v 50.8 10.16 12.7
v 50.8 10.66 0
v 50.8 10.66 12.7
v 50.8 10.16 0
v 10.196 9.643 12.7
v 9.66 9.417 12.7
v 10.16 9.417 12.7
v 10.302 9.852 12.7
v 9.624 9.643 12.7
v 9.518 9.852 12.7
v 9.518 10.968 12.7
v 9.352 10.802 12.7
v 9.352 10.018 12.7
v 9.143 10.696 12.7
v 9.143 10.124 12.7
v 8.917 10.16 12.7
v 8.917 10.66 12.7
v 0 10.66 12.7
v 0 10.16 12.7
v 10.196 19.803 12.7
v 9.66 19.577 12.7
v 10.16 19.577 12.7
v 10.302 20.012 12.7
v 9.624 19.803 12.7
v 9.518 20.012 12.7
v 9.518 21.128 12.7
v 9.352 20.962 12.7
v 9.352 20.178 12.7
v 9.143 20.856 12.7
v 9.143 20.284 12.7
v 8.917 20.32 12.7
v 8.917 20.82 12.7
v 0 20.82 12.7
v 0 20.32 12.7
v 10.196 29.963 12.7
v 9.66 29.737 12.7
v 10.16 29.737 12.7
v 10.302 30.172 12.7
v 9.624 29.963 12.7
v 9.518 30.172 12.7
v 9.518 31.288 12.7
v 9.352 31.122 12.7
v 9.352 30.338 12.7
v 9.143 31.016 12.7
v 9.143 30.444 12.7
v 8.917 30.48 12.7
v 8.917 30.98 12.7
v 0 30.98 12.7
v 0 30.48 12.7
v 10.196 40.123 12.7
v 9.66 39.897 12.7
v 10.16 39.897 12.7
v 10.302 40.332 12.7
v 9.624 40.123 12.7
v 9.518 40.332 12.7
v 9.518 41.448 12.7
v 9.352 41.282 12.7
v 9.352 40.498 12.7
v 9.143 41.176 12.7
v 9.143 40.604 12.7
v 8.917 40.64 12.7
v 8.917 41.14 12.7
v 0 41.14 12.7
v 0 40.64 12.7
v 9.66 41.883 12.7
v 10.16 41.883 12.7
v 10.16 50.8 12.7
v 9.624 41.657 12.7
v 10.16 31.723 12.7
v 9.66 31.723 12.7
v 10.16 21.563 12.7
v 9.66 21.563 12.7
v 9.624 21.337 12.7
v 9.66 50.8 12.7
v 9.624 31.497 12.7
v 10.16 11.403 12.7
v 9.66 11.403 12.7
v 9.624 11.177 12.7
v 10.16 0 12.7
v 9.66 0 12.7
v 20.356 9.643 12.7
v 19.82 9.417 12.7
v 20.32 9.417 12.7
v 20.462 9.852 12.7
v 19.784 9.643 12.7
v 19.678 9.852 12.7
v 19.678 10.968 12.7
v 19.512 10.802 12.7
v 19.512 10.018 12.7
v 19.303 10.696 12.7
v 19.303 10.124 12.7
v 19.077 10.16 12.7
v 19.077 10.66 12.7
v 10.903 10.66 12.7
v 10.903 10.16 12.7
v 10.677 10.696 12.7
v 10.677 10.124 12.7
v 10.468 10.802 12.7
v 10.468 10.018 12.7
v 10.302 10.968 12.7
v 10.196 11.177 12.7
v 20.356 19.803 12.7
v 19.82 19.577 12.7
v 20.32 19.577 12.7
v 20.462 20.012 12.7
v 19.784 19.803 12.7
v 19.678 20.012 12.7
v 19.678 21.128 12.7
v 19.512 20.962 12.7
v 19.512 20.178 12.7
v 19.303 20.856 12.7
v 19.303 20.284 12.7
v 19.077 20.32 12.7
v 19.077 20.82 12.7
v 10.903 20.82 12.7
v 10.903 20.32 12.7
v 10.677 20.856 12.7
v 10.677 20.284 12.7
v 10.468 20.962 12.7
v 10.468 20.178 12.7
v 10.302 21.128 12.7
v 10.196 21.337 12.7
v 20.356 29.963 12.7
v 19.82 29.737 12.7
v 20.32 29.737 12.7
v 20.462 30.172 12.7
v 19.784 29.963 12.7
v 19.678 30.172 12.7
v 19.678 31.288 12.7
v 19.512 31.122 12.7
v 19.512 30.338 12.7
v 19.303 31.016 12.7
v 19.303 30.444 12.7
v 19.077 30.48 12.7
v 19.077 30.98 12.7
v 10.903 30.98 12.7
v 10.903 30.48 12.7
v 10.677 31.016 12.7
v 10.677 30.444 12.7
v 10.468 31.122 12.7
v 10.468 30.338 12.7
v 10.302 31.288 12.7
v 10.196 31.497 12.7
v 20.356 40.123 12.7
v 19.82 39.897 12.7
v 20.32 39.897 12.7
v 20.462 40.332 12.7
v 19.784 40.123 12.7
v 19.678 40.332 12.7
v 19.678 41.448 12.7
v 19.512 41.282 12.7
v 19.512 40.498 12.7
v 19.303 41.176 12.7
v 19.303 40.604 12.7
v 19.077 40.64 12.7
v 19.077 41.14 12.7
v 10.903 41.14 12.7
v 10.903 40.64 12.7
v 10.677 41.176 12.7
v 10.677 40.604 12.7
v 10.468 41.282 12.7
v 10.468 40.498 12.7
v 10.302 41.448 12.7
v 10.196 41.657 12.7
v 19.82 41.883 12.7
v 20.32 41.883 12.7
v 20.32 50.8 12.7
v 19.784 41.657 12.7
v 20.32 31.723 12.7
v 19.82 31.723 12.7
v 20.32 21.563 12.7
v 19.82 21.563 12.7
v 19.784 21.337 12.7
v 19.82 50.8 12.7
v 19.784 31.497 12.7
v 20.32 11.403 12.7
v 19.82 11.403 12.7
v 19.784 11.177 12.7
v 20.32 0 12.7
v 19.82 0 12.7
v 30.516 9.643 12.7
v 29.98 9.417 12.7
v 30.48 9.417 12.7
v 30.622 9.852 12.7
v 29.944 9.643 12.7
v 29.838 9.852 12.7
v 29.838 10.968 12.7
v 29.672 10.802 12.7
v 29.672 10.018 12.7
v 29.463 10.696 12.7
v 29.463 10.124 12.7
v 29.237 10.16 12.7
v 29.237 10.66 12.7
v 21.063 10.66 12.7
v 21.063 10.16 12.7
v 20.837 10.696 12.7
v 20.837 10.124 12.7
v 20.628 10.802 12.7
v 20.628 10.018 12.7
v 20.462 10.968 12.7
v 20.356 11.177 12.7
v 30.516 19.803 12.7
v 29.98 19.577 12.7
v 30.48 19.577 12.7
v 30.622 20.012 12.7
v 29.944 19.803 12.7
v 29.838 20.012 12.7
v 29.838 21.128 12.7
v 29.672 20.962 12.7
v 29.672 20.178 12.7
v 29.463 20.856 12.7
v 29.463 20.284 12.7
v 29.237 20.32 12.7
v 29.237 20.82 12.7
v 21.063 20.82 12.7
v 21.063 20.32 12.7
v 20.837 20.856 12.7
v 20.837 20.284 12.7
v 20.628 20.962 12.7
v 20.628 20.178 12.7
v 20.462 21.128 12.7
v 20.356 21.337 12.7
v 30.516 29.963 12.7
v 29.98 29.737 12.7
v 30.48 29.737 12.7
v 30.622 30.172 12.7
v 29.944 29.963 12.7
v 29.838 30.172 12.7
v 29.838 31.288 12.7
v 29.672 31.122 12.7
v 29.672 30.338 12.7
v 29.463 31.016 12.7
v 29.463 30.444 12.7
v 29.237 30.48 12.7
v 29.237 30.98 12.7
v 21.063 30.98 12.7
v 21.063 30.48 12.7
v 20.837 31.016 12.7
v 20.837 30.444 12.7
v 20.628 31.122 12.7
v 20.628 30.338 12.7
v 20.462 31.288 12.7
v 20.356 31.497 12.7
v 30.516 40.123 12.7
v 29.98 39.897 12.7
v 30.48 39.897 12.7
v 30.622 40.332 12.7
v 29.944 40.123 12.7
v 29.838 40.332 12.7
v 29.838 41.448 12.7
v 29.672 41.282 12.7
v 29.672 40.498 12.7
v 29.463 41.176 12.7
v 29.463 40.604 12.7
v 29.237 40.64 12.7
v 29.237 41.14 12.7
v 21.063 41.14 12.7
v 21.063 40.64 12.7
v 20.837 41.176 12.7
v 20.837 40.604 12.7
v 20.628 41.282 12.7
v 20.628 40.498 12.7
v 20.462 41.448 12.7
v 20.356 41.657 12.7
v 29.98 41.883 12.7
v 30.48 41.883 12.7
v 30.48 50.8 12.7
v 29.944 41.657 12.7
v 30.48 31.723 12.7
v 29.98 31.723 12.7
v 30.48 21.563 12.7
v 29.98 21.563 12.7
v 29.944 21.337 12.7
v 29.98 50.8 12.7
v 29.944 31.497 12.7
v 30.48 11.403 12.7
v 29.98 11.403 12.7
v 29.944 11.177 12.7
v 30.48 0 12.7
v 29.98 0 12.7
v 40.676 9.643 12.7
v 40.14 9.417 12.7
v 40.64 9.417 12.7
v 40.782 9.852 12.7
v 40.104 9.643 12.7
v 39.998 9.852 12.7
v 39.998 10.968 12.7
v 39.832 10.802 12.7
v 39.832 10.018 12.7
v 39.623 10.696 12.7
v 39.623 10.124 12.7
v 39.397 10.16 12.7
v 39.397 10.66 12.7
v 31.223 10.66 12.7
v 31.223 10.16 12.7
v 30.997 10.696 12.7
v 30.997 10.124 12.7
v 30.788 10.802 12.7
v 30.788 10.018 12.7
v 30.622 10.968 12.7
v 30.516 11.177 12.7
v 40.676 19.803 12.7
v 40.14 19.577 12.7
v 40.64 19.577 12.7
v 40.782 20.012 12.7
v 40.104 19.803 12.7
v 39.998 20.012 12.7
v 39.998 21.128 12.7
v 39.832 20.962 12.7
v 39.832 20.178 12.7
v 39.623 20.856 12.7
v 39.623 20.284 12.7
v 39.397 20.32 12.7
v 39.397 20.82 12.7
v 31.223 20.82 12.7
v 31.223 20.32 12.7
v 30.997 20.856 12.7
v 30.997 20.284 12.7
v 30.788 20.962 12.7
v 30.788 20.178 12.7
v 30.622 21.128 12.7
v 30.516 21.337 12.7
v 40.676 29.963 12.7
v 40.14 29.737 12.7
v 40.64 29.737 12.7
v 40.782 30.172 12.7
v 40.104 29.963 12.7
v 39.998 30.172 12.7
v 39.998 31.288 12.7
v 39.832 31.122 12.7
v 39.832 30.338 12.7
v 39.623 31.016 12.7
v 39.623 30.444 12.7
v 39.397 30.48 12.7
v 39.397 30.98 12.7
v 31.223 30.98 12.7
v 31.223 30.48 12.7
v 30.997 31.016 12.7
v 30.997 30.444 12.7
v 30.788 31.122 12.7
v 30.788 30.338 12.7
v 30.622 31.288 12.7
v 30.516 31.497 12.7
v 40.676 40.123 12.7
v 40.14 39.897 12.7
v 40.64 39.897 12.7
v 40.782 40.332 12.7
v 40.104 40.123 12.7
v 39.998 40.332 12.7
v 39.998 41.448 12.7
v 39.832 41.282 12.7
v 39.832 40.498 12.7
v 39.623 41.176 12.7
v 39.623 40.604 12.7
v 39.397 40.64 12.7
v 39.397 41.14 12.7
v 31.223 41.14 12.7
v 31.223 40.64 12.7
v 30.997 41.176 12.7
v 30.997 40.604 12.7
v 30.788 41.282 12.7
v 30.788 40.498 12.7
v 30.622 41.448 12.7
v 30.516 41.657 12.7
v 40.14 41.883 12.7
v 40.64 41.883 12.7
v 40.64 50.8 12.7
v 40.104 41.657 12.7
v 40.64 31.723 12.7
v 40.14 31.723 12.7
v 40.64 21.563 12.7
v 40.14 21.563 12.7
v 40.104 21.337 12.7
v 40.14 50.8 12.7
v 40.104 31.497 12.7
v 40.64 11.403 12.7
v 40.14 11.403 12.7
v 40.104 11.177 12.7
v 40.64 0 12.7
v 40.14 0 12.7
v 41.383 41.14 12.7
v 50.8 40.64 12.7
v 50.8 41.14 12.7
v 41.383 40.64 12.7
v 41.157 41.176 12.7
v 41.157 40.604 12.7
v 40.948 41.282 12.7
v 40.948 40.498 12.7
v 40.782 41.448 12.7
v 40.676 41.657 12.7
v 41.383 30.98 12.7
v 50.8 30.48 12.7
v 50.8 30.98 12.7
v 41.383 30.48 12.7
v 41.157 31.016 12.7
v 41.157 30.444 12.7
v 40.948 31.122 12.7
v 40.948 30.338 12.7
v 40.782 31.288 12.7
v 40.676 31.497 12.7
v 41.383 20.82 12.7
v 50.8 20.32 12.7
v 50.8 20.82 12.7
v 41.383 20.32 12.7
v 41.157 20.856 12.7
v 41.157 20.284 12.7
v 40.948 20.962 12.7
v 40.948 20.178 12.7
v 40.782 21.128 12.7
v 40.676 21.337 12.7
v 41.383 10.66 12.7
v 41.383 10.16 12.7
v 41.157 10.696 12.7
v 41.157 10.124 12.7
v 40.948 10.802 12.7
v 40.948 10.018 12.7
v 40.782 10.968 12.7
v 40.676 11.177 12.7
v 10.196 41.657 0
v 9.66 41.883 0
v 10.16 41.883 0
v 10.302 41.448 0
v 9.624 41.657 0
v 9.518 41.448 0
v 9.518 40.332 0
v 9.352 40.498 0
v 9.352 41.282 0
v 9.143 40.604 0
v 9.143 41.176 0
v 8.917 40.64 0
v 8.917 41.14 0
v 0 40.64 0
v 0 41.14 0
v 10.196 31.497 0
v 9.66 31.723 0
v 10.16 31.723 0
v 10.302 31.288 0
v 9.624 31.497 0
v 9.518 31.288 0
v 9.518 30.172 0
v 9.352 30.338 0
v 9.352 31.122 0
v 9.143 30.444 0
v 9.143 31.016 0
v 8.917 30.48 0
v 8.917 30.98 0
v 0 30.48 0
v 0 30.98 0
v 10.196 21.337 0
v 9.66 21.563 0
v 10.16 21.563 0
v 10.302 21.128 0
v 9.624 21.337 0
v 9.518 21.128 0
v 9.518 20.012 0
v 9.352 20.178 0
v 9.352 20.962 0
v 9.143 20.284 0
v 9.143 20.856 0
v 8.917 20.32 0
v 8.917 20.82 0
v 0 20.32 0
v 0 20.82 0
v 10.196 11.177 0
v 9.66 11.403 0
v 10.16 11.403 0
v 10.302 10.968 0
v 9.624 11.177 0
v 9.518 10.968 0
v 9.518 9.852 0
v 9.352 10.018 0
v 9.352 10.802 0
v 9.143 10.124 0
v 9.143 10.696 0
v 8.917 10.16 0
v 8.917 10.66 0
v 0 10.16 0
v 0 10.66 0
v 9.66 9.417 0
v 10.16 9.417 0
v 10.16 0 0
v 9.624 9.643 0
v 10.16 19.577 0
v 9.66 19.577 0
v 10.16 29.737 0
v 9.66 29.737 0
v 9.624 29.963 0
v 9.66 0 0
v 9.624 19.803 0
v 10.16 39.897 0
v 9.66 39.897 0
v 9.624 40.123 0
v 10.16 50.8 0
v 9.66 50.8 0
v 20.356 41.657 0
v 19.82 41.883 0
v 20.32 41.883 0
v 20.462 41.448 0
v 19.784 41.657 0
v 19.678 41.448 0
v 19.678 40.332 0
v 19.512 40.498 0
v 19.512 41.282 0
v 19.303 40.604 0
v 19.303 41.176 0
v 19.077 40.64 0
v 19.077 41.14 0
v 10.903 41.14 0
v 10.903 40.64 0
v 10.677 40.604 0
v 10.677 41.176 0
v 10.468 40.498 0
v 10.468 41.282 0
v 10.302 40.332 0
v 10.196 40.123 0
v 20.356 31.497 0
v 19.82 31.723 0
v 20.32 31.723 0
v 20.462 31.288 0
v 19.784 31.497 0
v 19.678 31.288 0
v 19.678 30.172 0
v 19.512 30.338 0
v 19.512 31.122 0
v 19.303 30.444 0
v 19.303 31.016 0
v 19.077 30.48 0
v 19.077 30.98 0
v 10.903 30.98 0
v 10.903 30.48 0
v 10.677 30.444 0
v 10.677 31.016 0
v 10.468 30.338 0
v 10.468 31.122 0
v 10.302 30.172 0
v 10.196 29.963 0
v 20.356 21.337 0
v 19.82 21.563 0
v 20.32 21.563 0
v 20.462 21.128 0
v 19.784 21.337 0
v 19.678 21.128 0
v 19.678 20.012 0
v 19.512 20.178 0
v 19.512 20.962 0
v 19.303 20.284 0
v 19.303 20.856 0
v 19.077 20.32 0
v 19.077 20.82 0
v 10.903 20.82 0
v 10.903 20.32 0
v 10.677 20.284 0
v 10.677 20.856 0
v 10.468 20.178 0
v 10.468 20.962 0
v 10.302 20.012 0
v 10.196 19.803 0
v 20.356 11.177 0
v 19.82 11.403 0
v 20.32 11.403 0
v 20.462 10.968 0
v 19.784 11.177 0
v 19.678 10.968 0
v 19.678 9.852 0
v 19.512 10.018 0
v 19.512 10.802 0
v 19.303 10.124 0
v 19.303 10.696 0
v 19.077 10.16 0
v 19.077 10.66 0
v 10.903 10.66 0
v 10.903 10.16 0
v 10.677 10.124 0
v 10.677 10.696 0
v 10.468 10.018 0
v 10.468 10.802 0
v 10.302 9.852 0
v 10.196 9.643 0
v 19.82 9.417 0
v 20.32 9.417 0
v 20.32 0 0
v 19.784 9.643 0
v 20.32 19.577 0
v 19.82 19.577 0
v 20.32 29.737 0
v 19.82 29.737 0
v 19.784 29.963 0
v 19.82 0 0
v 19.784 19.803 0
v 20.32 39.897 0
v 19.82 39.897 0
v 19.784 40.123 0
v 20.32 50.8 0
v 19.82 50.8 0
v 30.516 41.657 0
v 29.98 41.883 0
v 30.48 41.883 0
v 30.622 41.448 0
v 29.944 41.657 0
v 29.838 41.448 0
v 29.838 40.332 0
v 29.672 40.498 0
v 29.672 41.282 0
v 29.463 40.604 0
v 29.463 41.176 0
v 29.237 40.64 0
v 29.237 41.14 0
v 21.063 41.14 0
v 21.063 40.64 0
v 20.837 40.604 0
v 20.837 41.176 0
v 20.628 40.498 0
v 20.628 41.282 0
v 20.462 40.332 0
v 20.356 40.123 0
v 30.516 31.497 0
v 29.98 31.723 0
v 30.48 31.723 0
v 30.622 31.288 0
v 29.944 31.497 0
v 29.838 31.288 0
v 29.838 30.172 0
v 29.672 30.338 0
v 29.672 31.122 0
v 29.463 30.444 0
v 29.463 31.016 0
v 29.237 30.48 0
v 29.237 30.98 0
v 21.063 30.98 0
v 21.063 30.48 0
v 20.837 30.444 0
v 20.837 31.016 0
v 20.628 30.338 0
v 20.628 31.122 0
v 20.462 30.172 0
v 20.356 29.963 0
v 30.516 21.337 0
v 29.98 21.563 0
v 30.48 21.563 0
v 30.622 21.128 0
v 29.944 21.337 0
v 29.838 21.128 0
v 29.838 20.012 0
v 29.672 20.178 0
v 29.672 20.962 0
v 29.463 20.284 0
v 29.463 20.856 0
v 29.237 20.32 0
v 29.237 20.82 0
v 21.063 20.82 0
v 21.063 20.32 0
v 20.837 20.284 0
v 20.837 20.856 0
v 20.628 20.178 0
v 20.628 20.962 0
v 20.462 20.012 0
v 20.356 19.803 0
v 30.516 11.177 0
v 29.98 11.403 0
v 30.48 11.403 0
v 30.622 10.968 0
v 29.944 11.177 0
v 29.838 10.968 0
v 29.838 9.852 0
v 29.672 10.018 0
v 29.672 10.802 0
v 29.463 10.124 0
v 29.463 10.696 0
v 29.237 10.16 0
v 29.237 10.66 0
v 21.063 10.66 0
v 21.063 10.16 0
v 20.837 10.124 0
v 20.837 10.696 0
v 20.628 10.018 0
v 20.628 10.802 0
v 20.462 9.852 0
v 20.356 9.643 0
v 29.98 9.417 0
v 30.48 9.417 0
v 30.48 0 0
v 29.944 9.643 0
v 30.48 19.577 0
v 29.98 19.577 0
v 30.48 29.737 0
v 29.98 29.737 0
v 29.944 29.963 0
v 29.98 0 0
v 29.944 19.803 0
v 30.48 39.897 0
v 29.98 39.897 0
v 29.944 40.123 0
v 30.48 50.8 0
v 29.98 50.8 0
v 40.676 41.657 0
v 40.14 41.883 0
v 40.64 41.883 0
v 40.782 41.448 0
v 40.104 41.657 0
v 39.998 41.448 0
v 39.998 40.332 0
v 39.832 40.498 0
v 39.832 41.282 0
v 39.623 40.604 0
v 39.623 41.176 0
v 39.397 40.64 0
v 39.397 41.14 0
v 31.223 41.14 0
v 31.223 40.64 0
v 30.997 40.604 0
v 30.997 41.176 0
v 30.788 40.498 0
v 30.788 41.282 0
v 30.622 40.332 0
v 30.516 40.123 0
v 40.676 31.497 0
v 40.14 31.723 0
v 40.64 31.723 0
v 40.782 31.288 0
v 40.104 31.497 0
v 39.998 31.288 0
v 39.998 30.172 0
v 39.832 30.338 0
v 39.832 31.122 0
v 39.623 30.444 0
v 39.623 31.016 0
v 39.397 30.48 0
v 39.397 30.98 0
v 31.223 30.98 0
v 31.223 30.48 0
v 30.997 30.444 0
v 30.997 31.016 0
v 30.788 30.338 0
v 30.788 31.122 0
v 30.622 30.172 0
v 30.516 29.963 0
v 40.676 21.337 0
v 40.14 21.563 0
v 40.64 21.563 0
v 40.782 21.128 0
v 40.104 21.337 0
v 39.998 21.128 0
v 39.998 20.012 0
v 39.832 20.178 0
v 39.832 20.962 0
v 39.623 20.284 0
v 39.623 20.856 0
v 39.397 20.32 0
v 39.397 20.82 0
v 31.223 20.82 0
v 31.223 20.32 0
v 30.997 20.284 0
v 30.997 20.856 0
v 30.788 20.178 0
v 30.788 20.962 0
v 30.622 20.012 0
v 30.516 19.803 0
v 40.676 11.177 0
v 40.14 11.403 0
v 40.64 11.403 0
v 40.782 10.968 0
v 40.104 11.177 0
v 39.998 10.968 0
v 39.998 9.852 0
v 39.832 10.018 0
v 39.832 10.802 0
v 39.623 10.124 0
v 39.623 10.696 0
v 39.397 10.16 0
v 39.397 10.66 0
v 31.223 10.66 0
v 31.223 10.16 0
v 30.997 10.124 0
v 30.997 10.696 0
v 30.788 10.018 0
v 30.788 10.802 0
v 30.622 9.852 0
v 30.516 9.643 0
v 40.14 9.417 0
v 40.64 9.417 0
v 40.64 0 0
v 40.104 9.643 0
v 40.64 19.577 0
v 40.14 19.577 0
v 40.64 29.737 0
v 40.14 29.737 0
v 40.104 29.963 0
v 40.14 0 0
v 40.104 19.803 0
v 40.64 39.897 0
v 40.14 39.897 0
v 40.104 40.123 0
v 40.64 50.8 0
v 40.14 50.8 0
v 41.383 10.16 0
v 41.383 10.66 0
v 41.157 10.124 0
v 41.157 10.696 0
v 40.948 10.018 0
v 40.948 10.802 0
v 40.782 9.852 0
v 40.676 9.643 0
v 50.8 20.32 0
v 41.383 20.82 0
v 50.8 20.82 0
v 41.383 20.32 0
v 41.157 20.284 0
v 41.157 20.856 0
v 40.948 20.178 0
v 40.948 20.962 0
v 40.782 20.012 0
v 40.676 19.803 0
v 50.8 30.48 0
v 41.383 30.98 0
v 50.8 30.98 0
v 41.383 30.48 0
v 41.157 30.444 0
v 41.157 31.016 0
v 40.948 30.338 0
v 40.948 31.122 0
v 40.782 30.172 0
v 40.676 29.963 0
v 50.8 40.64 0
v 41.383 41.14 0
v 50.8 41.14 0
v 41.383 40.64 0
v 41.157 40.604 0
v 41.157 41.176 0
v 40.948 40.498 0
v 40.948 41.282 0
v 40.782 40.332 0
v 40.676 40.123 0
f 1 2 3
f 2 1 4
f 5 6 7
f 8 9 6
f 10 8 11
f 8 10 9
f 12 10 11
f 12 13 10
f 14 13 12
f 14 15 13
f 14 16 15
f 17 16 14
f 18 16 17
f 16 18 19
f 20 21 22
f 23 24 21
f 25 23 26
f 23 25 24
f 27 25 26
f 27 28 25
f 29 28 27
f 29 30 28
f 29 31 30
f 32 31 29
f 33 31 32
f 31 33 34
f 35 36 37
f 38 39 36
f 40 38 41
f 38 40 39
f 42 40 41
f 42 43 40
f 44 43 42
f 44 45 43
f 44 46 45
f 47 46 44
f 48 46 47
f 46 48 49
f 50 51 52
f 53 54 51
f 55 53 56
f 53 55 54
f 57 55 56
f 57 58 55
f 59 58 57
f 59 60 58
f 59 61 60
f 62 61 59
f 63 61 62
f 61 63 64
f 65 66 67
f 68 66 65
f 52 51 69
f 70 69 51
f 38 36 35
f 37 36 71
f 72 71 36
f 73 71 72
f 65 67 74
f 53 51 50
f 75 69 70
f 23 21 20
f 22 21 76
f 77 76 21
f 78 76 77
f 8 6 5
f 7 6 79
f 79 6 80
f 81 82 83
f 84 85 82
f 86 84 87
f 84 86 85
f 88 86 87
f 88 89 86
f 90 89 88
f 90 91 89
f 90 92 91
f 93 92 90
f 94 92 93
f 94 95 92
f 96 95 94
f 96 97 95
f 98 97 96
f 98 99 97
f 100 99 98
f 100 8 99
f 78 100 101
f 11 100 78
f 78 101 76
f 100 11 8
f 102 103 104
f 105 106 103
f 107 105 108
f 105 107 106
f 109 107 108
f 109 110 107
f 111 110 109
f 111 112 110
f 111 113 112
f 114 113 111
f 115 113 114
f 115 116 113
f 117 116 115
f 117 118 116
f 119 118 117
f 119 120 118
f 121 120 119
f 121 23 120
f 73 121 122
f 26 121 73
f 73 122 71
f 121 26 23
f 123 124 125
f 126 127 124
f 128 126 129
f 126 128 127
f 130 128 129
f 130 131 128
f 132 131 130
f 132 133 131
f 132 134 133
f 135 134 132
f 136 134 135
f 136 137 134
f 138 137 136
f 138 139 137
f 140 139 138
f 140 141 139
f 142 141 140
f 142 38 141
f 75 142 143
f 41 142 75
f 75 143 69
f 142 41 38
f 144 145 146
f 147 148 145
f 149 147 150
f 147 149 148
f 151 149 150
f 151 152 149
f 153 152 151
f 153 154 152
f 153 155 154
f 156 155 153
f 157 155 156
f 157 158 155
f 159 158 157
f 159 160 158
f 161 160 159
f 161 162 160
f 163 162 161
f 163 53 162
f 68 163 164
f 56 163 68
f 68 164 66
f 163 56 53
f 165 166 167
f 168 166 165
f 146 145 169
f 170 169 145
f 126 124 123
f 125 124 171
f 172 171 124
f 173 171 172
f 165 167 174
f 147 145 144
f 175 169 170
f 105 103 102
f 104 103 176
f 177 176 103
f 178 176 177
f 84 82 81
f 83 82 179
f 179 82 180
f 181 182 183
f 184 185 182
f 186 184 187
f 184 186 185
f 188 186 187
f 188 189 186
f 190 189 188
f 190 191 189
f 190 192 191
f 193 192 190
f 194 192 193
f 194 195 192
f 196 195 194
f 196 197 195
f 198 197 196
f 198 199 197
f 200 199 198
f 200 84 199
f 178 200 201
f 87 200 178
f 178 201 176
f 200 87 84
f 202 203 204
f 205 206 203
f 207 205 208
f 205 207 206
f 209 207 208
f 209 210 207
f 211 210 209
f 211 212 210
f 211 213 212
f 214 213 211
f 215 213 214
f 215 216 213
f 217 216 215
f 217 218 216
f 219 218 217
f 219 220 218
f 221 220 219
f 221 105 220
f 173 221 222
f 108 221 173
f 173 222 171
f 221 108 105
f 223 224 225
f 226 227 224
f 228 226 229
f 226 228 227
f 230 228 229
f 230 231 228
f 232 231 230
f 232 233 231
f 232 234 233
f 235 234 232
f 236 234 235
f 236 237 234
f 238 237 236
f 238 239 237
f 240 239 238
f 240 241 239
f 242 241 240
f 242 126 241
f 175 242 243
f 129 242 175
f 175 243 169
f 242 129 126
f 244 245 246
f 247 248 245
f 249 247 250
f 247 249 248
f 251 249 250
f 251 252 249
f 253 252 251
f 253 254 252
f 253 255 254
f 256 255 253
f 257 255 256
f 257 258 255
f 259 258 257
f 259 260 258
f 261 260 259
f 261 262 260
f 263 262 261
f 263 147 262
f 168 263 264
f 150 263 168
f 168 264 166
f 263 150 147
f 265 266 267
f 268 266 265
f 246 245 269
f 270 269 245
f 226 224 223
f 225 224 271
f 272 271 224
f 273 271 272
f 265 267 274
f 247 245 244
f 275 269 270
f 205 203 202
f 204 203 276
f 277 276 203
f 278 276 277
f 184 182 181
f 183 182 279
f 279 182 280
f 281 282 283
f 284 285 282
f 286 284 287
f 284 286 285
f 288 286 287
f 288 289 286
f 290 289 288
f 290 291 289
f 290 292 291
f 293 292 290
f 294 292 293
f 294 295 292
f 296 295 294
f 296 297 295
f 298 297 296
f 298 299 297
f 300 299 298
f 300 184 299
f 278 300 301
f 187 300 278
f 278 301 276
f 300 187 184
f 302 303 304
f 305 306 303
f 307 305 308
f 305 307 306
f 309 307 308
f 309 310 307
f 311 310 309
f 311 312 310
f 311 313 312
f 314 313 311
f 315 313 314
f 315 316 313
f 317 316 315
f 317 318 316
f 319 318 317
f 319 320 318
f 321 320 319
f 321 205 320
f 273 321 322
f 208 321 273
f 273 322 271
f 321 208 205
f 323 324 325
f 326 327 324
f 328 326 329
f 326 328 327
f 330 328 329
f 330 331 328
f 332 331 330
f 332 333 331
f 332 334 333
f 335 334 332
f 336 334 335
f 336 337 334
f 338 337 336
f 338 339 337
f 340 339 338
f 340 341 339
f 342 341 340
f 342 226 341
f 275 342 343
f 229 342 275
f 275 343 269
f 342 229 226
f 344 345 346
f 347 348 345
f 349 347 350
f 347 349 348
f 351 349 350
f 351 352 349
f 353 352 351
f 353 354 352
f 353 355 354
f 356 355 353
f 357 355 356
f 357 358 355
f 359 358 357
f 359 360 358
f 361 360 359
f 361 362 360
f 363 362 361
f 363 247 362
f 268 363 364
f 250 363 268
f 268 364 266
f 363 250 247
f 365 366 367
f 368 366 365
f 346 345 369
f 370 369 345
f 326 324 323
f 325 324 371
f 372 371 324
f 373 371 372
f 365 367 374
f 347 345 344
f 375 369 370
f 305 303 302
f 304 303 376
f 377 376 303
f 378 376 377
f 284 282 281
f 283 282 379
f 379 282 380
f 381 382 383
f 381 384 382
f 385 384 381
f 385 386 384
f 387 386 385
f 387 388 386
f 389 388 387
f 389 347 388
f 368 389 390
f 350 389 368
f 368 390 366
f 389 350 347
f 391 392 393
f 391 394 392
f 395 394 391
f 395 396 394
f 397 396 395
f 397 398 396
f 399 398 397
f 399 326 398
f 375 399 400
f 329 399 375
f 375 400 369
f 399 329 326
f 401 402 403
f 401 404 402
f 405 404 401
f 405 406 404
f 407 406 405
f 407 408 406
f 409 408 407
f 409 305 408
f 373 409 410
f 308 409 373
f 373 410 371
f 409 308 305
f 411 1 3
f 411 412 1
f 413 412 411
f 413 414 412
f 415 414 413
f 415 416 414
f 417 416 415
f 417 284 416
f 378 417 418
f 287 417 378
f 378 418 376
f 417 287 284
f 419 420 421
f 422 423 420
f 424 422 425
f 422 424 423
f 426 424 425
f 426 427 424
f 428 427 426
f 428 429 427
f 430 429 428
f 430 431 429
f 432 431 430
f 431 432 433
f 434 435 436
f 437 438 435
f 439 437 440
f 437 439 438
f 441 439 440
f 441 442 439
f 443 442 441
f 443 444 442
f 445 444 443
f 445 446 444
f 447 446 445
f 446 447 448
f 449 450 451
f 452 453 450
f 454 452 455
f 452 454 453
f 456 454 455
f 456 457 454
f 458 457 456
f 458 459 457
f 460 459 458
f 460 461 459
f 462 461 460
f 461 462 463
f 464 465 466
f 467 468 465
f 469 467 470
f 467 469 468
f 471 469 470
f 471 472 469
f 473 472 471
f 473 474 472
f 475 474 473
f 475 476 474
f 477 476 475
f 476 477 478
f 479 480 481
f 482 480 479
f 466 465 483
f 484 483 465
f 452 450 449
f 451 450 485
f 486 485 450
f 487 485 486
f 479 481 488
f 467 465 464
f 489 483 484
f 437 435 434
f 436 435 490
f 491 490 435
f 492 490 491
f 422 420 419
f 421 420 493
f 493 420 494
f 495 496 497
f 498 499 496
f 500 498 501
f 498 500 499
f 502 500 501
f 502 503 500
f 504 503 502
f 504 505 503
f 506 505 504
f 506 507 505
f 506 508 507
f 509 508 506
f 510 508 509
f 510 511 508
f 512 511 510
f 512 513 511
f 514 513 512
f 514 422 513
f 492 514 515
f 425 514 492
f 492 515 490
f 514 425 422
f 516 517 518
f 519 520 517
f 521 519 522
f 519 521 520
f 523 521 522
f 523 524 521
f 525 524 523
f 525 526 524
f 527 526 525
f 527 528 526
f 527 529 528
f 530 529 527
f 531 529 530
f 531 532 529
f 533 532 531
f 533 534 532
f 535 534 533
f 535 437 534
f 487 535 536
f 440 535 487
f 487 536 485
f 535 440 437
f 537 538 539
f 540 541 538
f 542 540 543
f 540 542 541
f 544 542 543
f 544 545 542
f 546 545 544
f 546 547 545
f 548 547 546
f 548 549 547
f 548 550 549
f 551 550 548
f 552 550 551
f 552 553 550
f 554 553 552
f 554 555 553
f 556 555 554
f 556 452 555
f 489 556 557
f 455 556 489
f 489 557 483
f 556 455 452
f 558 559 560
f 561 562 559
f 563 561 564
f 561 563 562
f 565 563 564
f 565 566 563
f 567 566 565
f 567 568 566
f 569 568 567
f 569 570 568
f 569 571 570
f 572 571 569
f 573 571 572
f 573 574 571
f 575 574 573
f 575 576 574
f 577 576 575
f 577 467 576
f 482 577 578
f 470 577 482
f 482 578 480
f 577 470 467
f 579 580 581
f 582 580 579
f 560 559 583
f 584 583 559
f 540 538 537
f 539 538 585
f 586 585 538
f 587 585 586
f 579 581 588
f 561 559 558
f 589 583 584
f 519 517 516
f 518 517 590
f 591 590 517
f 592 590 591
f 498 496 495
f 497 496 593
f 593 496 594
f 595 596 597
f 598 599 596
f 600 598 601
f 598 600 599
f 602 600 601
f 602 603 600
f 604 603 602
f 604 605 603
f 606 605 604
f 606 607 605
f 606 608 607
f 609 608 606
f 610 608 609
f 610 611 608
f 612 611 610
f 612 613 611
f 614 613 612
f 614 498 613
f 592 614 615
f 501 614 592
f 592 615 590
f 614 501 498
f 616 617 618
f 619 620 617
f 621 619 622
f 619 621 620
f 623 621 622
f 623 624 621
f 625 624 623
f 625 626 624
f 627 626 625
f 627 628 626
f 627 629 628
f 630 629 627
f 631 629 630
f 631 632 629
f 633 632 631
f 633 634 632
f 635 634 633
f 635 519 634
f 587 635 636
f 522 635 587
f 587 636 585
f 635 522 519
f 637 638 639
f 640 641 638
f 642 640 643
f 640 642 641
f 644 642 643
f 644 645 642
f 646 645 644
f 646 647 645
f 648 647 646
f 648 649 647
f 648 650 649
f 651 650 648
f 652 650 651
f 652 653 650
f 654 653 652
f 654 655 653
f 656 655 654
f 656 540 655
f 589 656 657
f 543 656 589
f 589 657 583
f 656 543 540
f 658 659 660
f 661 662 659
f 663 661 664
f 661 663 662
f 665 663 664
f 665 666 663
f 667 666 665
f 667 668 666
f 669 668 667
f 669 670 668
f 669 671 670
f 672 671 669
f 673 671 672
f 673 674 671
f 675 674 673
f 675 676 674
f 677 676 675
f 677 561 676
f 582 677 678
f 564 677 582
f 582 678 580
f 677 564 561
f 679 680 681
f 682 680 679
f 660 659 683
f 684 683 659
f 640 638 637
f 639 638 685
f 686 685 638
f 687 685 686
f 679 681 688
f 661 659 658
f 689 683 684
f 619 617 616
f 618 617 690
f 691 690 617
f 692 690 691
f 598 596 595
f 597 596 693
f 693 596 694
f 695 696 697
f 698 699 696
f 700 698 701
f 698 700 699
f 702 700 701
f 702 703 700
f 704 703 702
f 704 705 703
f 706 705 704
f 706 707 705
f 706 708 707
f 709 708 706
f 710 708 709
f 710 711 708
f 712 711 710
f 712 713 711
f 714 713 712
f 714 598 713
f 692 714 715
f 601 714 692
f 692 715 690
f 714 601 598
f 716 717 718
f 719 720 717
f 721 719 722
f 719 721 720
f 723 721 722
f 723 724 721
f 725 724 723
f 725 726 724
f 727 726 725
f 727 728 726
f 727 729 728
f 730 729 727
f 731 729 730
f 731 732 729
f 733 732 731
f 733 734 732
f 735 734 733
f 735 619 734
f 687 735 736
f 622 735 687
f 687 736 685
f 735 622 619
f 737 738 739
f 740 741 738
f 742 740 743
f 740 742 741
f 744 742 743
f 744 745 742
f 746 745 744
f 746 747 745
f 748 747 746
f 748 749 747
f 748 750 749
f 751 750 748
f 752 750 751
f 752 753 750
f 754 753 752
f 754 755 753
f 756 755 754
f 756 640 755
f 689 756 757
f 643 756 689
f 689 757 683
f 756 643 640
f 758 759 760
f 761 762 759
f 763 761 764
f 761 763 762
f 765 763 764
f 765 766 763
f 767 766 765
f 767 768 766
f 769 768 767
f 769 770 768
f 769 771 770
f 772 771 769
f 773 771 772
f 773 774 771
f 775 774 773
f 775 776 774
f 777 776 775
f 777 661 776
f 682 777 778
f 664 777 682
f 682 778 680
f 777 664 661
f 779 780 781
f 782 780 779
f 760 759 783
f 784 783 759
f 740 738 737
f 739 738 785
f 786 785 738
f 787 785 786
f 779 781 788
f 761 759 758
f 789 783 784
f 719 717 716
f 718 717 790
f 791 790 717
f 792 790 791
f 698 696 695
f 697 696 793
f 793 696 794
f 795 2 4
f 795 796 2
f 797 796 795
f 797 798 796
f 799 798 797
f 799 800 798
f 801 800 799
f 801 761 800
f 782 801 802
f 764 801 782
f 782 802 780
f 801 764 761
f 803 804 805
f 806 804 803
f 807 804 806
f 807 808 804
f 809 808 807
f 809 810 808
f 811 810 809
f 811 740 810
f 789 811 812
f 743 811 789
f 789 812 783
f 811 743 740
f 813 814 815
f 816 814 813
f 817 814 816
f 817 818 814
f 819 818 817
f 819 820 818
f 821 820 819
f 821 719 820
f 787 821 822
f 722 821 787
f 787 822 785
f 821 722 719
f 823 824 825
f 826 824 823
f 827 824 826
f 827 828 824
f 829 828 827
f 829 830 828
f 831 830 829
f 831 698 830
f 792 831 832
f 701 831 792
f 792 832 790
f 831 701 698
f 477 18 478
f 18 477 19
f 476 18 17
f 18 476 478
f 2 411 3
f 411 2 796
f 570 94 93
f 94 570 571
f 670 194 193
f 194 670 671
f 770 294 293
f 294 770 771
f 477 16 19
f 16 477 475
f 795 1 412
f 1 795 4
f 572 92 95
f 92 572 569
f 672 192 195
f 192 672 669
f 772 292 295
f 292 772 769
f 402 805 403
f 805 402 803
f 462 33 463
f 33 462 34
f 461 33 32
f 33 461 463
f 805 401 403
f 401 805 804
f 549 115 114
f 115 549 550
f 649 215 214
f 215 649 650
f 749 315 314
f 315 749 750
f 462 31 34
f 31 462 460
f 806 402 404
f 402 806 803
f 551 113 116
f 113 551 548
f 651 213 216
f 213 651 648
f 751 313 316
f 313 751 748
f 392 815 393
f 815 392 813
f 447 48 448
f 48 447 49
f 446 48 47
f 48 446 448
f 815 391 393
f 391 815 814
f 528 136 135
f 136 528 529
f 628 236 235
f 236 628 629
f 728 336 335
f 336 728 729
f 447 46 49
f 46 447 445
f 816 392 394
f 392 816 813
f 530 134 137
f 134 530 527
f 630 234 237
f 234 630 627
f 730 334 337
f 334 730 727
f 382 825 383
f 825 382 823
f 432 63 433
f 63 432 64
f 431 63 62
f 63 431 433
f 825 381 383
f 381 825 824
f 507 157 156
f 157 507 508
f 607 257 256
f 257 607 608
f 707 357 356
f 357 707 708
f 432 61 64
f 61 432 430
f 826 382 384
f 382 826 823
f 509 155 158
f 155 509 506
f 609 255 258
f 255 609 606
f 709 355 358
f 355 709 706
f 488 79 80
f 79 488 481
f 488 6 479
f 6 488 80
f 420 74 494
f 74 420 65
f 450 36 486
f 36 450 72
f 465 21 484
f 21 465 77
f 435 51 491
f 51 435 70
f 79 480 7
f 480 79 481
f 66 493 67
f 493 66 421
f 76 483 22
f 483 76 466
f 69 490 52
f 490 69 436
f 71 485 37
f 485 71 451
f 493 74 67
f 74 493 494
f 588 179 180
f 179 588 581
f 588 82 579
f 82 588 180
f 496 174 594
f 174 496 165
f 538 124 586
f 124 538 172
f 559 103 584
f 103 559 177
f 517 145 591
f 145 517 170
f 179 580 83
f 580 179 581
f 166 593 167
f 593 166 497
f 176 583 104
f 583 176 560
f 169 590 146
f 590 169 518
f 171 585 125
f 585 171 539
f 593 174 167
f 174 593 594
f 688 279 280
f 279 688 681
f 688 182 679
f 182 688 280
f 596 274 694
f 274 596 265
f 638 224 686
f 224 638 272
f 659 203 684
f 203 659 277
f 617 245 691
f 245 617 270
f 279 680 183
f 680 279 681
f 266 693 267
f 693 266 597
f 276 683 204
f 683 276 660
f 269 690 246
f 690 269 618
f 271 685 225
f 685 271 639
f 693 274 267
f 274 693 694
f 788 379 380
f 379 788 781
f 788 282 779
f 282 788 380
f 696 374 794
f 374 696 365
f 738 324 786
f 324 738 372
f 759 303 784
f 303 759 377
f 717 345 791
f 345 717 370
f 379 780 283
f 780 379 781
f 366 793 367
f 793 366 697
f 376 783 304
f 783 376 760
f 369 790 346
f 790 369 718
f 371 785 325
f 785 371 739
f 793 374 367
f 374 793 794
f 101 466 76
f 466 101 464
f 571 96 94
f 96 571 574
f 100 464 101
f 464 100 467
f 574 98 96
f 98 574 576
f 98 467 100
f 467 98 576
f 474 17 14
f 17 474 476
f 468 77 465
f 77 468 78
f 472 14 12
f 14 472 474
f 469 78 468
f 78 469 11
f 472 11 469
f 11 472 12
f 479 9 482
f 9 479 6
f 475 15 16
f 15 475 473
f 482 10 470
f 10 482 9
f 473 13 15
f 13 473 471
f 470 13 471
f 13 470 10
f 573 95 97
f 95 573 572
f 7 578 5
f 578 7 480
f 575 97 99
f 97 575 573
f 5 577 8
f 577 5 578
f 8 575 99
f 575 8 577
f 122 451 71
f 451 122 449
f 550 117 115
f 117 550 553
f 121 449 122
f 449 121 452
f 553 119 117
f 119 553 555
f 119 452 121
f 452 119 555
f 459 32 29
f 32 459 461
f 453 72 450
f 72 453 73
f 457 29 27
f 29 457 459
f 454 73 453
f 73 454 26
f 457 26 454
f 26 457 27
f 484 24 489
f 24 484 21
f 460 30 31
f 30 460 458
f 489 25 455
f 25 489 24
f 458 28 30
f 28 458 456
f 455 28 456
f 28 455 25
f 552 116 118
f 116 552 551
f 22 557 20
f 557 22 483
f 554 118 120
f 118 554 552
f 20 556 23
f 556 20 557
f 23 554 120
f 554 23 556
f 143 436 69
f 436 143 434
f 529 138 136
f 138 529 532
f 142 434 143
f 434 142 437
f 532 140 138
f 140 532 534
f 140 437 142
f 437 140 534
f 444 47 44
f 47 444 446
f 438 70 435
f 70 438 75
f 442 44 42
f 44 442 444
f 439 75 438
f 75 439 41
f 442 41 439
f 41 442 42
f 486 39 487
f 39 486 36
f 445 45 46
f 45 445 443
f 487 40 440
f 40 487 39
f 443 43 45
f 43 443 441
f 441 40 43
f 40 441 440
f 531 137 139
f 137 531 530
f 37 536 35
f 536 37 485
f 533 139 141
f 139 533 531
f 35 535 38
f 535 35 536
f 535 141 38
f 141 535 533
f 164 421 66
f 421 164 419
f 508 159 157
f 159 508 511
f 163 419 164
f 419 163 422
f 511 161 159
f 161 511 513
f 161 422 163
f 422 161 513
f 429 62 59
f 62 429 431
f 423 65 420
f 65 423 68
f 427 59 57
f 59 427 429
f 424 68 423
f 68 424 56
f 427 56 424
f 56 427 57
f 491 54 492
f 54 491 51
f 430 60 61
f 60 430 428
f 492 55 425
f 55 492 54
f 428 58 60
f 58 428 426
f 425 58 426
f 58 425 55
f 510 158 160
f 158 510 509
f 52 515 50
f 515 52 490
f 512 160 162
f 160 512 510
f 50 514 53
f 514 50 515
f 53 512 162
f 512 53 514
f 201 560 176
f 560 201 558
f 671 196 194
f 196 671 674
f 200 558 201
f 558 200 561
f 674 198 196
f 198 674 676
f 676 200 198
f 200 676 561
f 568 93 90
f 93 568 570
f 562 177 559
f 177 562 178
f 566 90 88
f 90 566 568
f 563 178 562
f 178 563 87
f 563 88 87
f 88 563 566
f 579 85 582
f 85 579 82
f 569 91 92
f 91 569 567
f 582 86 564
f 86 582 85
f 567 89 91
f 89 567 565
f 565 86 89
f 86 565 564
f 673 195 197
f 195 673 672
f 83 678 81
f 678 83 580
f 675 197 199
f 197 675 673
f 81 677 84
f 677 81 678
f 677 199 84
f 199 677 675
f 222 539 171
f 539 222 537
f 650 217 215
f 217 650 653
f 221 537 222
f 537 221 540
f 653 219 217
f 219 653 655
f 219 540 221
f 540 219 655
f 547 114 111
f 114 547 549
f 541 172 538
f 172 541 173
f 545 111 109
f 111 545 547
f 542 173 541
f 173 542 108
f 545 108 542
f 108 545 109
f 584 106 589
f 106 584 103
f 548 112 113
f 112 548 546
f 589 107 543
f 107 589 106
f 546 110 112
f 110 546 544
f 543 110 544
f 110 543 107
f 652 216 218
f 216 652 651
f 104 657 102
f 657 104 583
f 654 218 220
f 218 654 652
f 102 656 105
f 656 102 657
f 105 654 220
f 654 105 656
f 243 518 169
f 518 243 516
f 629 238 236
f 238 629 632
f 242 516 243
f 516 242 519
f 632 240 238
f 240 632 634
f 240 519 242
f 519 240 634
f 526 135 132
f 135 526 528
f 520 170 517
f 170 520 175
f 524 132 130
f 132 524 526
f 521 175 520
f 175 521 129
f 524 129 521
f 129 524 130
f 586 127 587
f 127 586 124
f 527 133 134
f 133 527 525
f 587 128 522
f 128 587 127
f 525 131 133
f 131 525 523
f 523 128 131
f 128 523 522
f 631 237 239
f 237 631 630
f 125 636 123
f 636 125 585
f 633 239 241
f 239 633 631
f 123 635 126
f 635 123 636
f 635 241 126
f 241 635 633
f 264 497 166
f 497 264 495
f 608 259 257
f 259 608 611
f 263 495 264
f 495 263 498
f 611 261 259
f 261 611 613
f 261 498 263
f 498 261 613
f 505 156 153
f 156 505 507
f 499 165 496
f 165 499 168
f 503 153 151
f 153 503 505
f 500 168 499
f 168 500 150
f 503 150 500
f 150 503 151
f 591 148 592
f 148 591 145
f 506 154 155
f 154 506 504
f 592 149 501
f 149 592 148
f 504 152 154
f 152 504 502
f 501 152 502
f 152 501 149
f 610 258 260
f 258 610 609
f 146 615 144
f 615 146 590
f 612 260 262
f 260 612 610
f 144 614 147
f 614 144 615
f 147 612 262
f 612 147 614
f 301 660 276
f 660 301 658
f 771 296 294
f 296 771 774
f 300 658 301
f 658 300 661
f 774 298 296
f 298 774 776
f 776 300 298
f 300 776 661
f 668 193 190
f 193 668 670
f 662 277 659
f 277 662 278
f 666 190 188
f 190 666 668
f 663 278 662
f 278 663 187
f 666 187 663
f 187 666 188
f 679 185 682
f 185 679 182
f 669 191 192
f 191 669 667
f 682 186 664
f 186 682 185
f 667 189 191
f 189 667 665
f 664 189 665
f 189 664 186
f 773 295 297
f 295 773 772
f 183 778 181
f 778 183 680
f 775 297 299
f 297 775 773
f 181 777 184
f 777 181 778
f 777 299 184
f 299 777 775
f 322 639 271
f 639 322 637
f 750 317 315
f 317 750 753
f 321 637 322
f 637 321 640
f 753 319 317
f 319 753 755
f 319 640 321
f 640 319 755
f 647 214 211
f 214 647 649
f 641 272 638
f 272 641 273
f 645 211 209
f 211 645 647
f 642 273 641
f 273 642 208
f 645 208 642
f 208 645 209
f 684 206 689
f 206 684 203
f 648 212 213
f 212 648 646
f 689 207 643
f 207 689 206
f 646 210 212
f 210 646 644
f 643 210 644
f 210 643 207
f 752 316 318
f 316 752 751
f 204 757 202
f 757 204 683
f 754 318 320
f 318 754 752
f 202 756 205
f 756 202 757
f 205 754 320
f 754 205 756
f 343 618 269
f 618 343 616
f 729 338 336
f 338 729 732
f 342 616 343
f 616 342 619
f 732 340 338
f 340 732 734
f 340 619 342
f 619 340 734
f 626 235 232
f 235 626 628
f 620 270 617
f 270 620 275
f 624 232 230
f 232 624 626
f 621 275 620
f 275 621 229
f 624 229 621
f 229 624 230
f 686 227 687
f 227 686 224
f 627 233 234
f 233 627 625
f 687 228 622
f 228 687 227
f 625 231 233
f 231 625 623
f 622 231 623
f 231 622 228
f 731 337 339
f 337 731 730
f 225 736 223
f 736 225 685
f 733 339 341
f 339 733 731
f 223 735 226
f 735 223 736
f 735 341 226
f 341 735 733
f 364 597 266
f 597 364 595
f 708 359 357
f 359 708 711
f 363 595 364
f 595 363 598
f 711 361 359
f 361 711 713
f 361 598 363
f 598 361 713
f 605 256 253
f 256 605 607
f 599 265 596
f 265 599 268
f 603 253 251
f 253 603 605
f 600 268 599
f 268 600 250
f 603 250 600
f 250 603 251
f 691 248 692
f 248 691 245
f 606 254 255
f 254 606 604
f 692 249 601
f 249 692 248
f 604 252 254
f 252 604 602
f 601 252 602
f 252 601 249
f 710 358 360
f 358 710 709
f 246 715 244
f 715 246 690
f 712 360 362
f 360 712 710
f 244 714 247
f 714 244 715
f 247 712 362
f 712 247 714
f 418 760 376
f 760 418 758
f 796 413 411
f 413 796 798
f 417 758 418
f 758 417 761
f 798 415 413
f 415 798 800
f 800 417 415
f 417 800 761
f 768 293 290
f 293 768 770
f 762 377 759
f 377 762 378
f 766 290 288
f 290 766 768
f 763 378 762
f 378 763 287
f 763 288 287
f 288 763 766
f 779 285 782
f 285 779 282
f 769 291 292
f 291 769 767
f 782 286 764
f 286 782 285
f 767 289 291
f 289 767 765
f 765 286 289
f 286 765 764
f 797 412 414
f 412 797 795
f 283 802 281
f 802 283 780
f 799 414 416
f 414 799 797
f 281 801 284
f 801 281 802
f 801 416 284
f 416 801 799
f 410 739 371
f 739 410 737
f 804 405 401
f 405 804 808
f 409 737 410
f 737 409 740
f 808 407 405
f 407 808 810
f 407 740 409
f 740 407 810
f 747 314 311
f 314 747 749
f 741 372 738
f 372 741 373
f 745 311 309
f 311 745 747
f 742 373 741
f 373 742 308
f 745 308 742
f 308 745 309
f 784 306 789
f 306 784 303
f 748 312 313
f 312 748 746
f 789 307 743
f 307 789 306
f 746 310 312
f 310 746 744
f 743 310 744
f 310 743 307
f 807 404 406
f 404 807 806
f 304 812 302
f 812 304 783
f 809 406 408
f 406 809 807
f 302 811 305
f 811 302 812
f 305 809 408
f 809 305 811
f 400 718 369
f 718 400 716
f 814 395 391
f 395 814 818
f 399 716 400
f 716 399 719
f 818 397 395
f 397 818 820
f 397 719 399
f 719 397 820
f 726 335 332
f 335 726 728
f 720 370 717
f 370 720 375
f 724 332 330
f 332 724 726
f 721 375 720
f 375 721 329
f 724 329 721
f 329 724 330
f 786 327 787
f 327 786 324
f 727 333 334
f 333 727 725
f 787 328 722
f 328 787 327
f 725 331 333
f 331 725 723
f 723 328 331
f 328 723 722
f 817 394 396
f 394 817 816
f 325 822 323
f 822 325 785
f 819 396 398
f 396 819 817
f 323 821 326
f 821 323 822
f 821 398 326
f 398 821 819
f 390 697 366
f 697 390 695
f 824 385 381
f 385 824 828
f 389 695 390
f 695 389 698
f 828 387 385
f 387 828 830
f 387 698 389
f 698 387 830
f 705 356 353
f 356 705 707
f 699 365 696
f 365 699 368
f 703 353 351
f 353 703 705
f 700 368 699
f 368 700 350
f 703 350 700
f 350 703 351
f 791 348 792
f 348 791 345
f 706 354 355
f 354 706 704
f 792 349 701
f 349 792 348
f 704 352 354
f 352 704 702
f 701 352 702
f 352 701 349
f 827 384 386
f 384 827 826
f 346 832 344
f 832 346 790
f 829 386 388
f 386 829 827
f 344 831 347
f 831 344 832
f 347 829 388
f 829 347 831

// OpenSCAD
height=12.7;				//divider height
width=50.8;			//container width
depth=50.8;			//container depth
row_dividers=4;		//# row dividers
column_dividers=4;	//# column dividers
fillet_diam=1.5;	   //fillet diameter 
wall_thickness=0.5;		//wall thickness

ff=0.001*1;				//fudge factor to create a closed manifold



union()
{

//// Dividers

	for(j = [0:row_dividers - 1])
	{
		translate([0,(depth/(row_dividers+1))+j*(depth/(row_dividers+1)),0]) cube([width,wall_thickness,height]);
	}

	for(k = [0:column_dividers - 1])
	{
		rotate([0,0,90]) translate([0,-(width/(column_dividers+1))-k*(width/(column_dividers+1)),0]) cube([depth,wall_thickness,height]);
	}

//// Fillets

	for(m = [0:column_dividers - 1])
	{
		for(n = [0:row_dividers - 1])
		{
			//// Upper right fillet
			translate([(width/(column_dividers+1))+m*(width/(column_dividers+1))-ff,(depth/(row_dividers+1))+n*(depth/(row_dividers+1))+wall_thickness-ff,0]) fillet();

			//// Upper left fillet
			translate([(width/(column_dividers+1))+m*(width/(column_dividers+1))-wall_thickness+ff,(depth/(row_dividers+1))+n*(depth/(row_dividers+1))+wall_thickness-ff,0]) rotate([0,0,90]) fillet();

			//// Lower left fillet
			translate([(width/(column_dividers+1))+m*(width/(column_dividers+1))-wall_thickness+ff,(depth/(row_dividers+1))+n*(depth/(row_dividers+1))+ff,0]) rotate([0,0,180]) fillet();

			//// Lower right fillet
			translate([(width/(column_dividers+1))+m*(width/(column_dividers+1))-ff,(depth/(row_dividers+1))+n*(depth/(row_dividers+1))+ff,0]) rotate([0,0,270]) fillet();

		}
	}

};



//////////// module definitions ///////////////////////

module fillet() 
{
	difference()
	{
		cube([fillet_diam/2,fillet_diam/2,height]);
		translate([fillet_diam/2,fillet_diam/2,0]) cylinder(h=(height+1)*2,r=fillet_diam/2,center=true,$fn=20);
	}
};
